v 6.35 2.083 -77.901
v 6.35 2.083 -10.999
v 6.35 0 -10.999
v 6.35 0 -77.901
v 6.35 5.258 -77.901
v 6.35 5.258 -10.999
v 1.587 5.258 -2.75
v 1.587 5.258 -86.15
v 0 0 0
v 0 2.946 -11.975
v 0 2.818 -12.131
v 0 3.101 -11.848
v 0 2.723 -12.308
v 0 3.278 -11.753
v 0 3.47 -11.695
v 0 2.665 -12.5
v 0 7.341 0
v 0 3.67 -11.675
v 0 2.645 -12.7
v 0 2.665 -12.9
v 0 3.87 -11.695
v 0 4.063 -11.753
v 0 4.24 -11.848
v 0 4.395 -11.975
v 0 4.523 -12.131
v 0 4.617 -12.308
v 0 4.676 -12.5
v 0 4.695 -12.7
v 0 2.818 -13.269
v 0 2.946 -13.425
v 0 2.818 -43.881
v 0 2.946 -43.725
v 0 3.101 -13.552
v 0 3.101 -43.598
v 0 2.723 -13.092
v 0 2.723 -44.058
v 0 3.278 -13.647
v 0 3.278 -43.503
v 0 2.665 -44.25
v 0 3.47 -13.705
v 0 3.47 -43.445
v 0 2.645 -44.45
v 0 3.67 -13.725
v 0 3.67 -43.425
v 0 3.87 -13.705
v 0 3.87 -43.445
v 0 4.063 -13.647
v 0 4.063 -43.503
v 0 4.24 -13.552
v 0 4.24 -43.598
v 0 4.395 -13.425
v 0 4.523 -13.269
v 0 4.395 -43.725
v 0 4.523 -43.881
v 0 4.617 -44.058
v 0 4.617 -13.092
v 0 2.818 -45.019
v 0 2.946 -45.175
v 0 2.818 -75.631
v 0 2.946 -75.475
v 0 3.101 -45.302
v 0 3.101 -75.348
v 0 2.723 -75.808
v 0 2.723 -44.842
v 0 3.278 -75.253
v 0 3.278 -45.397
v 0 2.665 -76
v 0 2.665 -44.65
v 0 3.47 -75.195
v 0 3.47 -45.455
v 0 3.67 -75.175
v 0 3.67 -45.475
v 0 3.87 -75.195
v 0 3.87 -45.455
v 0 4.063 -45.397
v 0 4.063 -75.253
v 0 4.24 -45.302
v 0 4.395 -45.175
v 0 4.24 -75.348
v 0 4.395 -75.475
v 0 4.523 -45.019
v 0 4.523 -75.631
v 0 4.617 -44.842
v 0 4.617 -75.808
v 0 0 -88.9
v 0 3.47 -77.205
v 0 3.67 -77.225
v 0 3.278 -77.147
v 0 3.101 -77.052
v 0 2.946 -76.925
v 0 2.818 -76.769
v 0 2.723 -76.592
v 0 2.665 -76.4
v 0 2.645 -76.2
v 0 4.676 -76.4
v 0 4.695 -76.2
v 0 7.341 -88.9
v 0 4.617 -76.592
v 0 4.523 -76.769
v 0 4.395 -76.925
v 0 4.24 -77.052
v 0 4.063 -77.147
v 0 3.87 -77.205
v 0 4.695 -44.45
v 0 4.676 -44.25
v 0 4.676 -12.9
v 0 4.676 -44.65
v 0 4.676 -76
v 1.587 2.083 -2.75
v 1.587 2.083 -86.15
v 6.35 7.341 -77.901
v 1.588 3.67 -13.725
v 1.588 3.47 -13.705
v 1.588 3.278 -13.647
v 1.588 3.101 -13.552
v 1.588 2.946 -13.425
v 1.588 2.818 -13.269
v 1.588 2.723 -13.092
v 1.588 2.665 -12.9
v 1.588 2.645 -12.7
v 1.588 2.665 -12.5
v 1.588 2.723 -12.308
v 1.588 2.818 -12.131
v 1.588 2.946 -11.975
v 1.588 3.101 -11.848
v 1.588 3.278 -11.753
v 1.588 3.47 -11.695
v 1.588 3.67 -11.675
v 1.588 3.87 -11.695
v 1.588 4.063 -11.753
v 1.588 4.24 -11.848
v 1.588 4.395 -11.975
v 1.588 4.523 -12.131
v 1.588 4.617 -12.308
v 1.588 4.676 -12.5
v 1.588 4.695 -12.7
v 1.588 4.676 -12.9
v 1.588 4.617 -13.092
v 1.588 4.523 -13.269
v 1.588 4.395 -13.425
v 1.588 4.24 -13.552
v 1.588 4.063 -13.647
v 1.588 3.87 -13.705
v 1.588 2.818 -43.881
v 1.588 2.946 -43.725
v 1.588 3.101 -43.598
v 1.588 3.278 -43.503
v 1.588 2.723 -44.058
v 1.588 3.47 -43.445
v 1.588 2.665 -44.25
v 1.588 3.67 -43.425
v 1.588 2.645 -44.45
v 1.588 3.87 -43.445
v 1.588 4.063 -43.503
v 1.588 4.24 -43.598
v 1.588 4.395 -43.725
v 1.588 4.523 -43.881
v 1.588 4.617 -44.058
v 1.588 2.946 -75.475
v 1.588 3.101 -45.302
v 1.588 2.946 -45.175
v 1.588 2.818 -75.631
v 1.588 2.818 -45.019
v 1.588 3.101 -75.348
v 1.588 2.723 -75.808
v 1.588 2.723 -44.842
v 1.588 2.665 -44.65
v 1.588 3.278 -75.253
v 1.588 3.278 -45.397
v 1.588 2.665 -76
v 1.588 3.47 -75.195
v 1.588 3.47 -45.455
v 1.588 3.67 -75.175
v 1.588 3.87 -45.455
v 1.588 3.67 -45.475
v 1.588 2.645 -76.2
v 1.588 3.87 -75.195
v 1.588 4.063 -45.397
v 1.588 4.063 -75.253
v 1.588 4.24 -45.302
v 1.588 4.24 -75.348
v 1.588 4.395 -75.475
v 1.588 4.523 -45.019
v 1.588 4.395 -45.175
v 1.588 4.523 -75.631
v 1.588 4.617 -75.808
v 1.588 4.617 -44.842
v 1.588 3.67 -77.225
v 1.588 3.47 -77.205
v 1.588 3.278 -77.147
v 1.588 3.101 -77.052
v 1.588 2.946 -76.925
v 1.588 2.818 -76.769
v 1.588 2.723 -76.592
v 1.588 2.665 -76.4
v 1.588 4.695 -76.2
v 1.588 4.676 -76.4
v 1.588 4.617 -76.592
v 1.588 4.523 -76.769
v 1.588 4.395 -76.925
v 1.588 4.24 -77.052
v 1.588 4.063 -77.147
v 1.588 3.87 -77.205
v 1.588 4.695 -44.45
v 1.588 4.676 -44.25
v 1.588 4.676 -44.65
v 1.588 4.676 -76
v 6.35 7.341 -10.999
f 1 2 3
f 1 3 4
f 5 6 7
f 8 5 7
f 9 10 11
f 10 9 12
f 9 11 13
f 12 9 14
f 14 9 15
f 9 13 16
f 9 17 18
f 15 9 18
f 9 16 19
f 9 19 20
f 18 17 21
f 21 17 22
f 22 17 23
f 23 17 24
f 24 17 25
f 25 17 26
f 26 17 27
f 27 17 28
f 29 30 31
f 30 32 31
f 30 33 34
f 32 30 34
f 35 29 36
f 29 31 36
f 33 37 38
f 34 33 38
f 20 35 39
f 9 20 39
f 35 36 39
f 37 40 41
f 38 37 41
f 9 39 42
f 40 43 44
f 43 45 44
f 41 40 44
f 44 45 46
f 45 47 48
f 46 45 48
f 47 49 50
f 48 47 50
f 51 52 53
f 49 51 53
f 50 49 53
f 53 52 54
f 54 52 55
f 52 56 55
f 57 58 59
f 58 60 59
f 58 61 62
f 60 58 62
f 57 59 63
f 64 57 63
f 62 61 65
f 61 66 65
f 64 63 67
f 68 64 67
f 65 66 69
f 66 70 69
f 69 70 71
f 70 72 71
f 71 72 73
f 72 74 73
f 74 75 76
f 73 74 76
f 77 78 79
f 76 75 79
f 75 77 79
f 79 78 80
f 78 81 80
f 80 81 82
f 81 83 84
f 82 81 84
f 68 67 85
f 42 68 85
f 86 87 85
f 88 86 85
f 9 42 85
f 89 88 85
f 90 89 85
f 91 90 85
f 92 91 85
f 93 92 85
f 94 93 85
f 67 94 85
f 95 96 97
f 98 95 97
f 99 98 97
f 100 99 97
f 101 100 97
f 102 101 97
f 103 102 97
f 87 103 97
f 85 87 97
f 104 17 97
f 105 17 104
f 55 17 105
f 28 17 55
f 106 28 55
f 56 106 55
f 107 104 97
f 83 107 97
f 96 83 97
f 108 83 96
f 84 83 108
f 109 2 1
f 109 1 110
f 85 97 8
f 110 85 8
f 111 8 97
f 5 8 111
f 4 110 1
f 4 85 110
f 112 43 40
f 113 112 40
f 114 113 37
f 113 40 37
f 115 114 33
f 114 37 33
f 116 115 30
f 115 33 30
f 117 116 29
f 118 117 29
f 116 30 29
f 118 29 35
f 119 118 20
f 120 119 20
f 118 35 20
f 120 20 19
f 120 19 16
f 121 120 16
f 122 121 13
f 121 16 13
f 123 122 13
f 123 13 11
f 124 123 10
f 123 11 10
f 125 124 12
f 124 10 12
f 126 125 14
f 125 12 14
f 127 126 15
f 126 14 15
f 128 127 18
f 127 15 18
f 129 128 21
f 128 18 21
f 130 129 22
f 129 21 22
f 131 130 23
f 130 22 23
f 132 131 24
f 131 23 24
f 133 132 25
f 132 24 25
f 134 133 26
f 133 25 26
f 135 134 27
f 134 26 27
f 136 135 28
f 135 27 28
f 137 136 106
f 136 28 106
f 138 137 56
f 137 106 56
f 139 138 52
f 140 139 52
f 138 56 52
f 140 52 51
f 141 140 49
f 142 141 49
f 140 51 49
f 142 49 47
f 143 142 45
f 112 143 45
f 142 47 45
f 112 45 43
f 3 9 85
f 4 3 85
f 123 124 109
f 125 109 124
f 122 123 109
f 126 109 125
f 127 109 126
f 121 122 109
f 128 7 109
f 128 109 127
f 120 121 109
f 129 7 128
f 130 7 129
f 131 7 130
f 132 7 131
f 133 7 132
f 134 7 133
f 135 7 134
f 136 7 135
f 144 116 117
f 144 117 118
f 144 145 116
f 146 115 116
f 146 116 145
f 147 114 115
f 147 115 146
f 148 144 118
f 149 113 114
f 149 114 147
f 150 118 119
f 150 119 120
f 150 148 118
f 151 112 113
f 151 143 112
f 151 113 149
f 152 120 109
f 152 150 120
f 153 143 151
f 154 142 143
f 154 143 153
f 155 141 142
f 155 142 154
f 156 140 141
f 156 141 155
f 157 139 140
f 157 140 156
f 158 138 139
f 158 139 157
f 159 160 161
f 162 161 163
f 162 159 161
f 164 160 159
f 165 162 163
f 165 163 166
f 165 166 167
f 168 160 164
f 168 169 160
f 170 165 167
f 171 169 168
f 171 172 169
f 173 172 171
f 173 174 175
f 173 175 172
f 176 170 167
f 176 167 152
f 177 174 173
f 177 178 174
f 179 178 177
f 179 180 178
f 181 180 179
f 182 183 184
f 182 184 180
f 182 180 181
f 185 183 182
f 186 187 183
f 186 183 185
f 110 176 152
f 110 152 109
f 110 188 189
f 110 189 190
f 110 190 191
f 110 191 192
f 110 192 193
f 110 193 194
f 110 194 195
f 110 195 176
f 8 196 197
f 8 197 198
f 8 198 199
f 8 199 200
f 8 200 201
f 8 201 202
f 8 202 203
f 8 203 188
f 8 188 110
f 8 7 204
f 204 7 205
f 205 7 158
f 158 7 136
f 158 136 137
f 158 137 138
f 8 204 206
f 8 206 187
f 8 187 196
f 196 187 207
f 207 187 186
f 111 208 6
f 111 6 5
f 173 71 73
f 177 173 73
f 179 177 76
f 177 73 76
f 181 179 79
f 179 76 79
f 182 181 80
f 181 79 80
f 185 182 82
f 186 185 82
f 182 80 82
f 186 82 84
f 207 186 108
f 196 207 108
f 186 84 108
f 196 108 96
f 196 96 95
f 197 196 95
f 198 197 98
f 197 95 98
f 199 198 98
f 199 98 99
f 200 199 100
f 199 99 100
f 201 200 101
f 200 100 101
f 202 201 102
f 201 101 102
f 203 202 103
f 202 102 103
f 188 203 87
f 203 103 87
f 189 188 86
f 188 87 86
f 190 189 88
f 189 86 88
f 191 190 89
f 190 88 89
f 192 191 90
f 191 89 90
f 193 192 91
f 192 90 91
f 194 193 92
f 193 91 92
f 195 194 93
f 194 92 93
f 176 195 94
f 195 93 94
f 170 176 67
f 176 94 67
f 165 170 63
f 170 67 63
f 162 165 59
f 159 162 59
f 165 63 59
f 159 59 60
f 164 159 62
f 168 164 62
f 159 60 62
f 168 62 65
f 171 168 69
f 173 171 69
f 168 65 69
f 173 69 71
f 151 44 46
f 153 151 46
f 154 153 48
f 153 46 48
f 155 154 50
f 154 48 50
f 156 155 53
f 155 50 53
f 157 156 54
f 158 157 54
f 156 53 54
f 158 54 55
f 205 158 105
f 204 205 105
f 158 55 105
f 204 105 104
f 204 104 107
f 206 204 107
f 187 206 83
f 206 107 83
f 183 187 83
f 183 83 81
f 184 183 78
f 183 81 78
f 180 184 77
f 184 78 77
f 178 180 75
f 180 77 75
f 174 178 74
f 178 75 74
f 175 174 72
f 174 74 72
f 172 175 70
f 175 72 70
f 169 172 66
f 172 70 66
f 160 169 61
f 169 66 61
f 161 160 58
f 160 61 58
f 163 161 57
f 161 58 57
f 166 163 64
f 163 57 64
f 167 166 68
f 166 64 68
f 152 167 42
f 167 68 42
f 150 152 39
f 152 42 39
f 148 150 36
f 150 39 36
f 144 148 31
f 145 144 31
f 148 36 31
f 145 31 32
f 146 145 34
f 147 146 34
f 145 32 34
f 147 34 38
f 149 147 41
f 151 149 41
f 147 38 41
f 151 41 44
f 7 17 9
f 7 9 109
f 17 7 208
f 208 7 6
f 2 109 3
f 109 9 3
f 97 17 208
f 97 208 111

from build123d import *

# Parameters (mm, degrees)
SKETCH1_W           = 88.9
SKETCH1_H           = 7.3406
BOSS_EXTRUDE1_DEPTH = 6.35
SKETCH2_W           = 88.9
SKETCH2_H           = 3.175
CUT_EXTRUDE2_DEPTH  = 4.7625
CUT_EXTRUDE3_DEPTH  = 7.3406
SKETCH5_R           = 1.025
CUT_EXTRUDE4_DEPTH  = 1.5875


with BuildPart() as part:
    # Sketch1 → Boss-Extrude1 (new body)
    with BuildSketch(Plane(origin=(0, 0, 0), x_dir=(0, 0, -1), z_dir=(1, 0, 0))):
        with Locations((44.45, 3.6703)):
            Rectangle(SKETCH1_W, SKETCH1_H)
    extrude(amount=BOSS_EXTRUDE1_DEPTH)

    # Sketch2 → Cut-Extrude2 (cut)
    with BuildSketch(Plane(origin=(6.35, 0, 0), x_dir=(0, 0, -1), z_dir=(1, 0, 0))):
        with Locations((44.45, 3.6703)):
            Rectangle(SKETCH2_W, SKETCH2_H)
    extrude(amount=-CUT_EXTRUDE2_DEPTH, mode=Mode.SUBTRACT)

    # Sketch4 → Cut-Extrude3 (cut)
    with BuildSketch(Plane.XZ):
        Polygon((0, 0), (6.35, -10.998522628), (6.35, 0), align=None)
        Polygon((6.35, -77.901477372), (6.35, -88.9), (0, -88.9), align=None)
    extrude(amount=-CUT_EXTRUDE3_DEPTH, mode=Mode.SUBTRACT)

    # Sketch5 → Cut-Extrude4 (cut)
    with BuildSketch(Plane.ZY):
        with Locations((-76.2, 3.6703)):
            Circle(SKETCH5_R)
        with Locations((-44.45, 3.6703)):
            Circle(SKETCH5_R)
        with Locations(Location((-12.7, 3.6703, 0), (0, 0, 180))):
            Circle(SKETCH5_R)
    extrude(amount=-CUT_EXTRUDE4_DEPTH, mode=Mode.SUBTRACT)


solid = part.part
